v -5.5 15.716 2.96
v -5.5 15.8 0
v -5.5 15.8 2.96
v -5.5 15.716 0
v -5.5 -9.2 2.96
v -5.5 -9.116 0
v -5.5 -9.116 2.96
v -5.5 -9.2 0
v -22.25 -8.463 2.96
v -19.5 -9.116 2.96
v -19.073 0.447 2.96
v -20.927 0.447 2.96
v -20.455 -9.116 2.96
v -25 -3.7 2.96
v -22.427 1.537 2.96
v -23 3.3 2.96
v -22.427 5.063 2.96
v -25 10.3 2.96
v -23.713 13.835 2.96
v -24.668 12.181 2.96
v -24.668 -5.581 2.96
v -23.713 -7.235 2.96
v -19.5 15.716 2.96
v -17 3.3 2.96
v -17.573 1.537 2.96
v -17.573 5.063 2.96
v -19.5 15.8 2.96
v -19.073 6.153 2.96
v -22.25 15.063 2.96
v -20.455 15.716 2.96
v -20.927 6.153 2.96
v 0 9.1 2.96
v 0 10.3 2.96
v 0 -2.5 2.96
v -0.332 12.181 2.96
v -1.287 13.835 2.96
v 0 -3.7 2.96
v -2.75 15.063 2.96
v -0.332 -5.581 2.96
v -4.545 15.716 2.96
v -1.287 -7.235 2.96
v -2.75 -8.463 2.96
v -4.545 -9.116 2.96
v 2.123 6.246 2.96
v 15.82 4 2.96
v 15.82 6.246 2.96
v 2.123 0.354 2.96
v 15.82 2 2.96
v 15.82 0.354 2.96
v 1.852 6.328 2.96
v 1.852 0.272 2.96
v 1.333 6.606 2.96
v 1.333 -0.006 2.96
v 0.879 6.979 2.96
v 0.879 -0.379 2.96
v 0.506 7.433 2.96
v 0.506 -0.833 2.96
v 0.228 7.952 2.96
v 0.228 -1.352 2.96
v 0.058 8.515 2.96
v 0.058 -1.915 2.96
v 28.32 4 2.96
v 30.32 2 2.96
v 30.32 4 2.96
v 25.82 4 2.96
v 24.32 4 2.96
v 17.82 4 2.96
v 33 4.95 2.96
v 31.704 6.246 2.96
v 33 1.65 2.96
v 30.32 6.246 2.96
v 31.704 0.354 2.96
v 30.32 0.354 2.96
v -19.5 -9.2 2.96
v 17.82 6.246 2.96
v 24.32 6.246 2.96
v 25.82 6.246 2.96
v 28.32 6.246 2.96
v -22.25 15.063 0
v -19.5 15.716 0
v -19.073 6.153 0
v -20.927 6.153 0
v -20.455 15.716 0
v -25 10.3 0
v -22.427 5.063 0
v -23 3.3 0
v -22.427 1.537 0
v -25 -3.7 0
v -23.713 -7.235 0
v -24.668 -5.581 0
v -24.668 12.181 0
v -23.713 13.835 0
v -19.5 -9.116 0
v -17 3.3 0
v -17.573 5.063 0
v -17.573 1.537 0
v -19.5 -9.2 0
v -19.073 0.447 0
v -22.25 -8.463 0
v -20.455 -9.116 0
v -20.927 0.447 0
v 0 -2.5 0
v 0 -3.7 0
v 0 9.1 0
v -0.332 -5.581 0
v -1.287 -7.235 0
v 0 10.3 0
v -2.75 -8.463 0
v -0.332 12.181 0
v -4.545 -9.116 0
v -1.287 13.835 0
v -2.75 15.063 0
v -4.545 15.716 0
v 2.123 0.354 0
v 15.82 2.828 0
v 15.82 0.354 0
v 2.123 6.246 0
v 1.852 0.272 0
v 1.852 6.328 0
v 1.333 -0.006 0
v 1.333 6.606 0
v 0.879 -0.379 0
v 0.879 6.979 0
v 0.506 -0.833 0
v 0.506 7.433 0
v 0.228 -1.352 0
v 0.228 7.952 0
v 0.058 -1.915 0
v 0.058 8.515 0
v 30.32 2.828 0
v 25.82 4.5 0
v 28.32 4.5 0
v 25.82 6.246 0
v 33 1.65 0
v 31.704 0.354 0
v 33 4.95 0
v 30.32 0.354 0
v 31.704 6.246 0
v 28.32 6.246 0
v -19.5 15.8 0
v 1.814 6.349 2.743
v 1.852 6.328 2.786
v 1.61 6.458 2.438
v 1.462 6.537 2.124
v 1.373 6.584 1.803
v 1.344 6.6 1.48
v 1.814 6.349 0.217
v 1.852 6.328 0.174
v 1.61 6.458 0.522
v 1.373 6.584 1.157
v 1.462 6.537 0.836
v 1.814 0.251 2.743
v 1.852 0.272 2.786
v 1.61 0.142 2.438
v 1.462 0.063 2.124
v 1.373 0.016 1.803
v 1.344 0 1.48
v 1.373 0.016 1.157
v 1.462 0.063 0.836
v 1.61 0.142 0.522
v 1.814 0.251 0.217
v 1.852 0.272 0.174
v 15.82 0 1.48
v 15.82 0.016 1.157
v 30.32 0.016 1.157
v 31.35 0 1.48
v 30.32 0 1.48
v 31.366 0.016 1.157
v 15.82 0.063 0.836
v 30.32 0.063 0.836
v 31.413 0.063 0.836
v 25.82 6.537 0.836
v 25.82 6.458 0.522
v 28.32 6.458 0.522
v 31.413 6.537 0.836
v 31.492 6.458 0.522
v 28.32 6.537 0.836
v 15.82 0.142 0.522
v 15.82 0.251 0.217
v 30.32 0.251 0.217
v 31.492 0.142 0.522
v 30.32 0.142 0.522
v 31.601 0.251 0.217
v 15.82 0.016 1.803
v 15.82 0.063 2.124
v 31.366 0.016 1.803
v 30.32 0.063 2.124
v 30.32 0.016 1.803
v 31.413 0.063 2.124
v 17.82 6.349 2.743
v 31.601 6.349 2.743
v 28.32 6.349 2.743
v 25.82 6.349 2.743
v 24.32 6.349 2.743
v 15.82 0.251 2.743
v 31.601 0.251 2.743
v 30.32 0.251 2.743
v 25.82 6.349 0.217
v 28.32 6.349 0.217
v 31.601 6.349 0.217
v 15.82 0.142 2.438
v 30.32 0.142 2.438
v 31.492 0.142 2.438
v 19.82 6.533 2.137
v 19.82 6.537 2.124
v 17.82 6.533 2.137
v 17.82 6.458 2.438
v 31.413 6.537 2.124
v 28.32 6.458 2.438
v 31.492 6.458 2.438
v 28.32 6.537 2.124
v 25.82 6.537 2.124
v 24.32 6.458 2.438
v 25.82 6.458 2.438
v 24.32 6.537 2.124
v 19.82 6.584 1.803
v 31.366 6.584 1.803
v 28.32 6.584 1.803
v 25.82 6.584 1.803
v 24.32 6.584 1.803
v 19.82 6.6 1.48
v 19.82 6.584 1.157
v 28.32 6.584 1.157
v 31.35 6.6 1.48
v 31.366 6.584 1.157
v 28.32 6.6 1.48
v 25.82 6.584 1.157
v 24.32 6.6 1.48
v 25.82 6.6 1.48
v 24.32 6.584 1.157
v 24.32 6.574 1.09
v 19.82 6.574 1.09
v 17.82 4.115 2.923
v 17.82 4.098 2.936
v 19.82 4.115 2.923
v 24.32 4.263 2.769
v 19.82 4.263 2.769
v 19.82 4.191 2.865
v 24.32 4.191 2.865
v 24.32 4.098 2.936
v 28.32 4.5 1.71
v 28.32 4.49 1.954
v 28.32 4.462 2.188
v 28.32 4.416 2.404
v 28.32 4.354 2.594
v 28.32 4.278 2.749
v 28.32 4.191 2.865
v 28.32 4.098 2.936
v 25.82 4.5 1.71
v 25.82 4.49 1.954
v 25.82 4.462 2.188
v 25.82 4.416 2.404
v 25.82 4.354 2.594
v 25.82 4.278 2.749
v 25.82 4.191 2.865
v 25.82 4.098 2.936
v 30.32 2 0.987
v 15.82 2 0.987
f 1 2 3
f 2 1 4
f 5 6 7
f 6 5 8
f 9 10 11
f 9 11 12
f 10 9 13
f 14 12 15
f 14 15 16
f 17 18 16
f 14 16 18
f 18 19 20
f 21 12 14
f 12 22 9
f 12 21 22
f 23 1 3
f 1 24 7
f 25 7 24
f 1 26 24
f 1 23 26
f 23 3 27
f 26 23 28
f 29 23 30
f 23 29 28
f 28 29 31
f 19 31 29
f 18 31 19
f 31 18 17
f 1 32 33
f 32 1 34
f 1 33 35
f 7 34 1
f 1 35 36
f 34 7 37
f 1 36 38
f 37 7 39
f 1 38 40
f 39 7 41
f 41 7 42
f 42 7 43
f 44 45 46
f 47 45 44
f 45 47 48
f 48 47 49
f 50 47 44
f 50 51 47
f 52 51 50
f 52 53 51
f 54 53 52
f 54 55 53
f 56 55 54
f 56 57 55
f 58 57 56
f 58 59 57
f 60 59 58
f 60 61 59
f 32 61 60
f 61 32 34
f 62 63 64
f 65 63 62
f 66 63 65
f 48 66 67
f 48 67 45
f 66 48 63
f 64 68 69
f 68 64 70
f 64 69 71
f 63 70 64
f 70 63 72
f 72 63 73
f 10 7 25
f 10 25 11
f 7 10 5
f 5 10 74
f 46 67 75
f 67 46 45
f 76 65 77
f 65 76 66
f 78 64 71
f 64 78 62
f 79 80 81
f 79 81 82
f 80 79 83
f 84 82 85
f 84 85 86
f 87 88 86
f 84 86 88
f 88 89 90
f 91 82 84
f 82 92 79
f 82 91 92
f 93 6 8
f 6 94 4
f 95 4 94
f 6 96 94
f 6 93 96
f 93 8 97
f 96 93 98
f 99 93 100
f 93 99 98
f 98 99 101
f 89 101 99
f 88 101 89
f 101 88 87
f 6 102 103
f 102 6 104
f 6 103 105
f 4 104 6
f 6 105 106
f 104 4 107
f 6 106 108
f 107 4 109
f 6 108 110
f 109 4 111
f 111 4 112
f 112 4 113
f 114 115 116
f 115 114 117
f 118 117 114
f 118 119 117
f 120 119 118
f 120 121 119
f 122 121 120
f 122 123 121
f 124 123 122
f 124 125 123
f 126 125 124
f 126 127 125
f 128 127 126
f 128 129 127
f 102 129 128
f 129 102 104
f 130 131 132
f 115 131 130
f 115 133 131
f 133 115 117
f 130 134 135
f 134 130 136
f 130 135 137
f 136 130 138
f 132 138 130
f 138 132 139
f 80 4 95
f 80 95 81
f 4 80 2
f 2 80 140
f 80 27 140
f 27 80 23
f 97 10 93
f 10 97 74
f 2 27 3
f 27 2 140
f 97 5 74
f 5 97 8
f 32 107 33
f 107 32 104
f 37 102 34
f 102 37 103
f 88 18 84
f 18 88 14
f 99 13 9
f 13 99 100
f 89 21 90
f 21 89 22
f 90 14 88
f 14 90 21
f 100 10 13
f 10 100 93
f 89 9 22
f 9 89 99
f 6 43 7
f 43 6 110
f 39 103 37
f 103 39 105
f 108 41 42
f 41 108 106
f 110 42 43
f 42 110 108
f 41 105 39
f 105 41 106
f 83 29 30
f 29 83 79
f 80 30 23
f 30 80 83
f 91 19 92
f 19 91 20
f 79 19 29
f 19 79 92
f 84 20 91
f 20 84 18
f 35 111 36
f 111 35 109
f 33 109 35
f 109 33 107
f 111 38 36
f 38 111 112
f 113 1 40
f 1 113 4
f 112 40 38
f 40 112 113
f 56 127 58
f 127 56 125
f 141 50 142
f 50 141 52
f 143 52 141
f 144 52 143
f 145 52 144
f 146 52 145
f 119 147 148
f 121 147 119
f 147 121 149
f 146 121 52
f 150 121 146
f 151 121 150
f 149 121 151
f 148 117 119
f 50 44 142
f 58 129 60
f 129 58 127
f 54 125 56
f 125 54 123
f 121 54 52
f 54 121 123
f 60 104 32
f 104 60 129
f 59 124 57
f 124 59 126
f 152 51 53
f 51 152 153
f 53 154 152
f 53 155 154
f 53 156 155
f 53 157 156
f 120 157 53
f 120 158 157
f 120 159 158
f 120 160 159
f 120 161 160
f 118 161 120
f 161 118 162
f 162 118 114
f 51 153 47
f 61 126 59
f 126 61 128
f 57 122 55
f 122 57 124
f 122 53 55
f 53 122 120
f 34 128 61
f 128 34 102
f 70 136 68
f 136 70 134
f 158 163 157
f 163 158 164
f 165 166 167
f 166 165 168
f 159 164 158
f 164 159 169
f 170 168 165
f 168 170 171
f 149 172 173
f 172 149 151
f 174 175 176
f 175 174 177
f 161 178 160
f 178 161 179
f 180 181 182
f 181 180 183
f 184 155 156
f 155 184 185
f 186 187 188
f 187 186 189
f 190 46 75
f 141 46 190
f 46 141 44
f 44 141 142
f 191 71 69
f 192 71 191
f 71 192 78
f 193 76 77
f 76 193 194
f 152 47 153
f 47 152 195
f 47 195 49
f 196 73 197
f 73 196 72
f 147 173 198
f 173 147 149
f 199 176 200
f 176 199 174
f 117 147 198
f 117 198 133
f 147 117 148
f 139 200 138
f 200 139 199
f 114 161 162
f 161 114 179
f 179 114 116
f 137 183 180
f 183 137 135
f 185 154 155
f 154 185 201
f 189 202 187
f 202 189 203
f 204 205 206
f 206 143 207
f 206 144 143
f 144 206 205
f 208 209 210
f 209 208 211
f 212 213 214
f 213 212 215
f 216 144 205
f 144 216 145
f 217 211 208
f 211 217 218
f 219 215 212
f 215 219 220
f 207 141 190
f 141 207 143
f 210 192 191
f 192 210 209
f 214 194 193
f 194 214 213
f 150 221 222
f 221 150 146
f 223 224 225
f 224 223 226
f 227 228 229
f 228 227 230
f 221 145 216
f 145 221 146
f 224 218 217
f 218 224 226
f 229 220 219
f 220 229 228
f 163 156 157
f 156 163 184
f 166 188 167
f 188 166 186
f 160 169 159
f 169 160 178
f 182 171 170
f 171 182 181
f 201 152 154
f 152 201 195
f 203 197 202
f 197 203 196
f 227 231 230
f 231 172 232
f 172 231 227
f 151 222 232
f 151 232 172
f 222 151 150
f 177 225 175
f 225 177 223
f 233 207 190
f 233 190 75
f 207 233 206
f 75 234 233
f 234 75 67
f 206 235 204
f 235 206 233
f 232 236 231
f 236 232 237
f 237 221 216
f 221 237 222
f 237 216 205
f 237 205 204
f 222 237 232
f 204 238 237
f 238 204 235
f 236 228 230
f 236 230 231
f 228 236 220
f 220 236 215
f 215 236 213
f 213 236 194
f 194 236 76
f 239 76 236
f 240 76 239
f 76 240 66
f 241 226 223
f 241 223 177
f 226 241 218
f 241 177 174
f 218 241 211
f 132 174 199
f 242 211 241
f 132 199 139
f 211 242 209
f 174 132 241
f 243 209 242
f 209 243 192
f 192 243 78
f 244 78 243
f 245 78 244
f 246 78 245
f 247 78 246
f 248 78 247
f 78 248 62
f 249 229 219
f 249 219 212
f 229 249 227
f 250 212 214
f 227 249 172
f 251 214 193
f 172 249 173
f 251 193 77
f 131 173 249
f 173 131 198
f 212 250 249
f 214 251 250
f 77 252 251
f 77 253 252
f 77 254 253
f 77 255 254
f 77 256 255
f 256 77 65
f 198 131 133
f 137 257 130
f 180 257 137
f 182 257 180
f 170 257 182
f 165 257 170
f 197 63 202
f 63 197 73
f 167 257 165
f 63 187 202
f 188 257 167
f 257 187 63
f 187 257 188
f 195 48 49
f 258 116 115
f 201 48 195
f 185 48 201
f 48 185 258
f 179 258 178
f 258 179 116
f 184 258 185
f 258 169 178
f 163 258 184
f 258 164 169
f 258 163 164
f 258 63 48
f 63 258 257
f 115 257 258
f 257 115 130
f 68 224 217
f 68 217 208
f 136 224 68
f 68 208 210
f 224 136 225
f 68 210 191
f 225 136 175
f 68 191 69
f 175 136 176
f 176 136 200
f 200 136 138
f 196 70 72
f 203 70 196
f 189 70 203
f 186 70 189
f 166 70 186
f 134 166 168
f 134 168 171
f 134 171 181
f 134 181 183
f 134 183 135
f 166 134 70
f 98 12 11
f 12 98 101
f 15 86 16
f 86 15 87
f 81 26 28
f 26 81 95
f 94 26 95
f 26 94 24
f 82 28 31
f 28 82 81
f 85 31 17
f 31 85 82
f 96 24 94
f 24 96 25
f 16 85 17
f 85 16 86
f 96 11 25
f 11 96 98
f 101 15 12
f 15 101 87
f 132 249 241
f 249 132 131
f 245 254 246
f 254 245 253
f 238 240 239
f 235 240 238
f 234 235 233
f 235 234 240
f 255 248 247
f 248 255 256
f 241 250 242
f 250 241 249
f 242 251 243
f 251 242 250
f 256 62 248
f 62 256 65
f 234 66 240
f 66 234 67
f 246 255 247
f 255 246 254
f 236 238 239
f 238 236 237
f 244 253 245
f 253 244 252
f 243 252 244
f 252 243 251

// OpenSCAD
// Physical Keygen - by Nirav Patel <http://eclecti.cc>
//
// Generate a duplicate of an ABUS Plus key by editing the last line of the file
// and entering in the key code of the lock.  If you don't know the key code,
// you're going to need to get creative.  The first digit of the code is on the
// side closest to the shoulder. 6 is the minimum cut, which is uncut. 1 (0?)
// is the maximum cut.
//
// This work is licensed under a Creative Commons Attribution 3.0 Unported License.

module rounded(size, r) {
    union() {
        translate([r, 0, 0]) cube([size[0]-2*r, size[1], size[2]]);
        translate([0, r, 0]) cube([size[0], size[1]-2*r, size[2]]);
        translate([r, r, 0]) cylinder(h=size[2], r=r);
        translate([size[0]-r, r, 0]) cylinder(h=size[2], r=r);
        translate([r, size[1]-r, 0]) cylinder(h=size[2], r=r);
        translate([size[0]-r, size[1]-r, 0]) cylinder(h=size[2], r=r);
    }
}

module fillet(h, r) {
    difference() {
        cube([r, r, h]);
        translate([r, r, 0]) cylinder(h=h, r=r, $fn=32);
    }
}

module disc(thickness, angle) {
    rotate([angle, 0, 0]) cube([thickness, 10, 10]);
}

// ABUS Plus key.  Reverse engineered with measurements and information from
// Schuyler Towne and Jaakko Fagerlund
module abus_plus(bits) {
    // You may need to adjust these to fit your specific printer settings
    thickness = 2.96;
    length = 33.0;
    width = 6.6;
    
    shoulder = 2.68; // from tip
    depth_inc = 18; // degrees
    num_discs = 7;
    
    spacing = 2.0; // distance from the center of one disc to the next
    disc = 1.5; // thickness of the discs that will turn
    spacer = 0.5; // thickness of the spacers between the discs
    
    // Handle size
    h_l = 25;
    h_w = 25;
    
    union() {
        difference() {
            // blade and key handle
            union() {
                translate([-h_l, -h_w/2 + width/2, 0]) rounded([h_l, h_w, thickness], 5.5);
                
                translate([0, width-0.5, 0]) fillet(thickness, 3);
                translate([0, 0.5, 0]) mirror([0, 1, 0]) fillet(thickness, 3);
                
                intersection() {
                    translate([-1,0,0]) cube([length+1, width, thickness]);
                    
                    translate([-1, width/2, thickness/2]) rotate([0, 90, 0]) cylinder(h=length+1, r=width/2, $fn=64); 
                }
            }
            
            // chamfer the tip
           translate([length, width*(3/4), 0]) rotate([0, 0, 45]) cube([10, 10, thickness]);
           translate([length, width*(1/4), 0]) rotate([0, 0, 225]) cube([10, 10, thickness]);
            
            // put in a hole for keychain use
            translate([-h_l + 5, width/2, 0]) cylinder(h=thickness, r=3);
     
            // cut the actual bitting
            for (d = [0:(num_discs-1)]) {
                translate([length-shoulder-((num_discs-1)-d)*spacing-spacer, 4.0, thickness]) disc(spacer, -(6-bits[d])*depth_inc);
                translate([length-shoulder-((num_discs-1)-d)*spacing-spacing, 4.0, thickness]) disc(disc, -(6-bits[d])*depth_inc);
                translate([length-shoulder-((num_discs-1)-d)*spacing-(spacing+spacer), 4.0, thickness]) disc(spacer, -(6-bits[d])*depth_inc);
            }
            
            // cut an open channel into the other side.  one interfacing surface is enough
            translate([length-shoulder-(num_discs*spacing+spacer), 0, 0]) {
                cube([num_discs*spacing+spacer, 2, thickness]);
                translate([0, 2, thickness/3]) rotate([220, 0, 0]) cube([num_discs*spacing+spacer, 2, thickness]);
            }
        }
        
        // adds back in some thickness for the low value bits
        union() {
            translate([length-shoulder-(num_discs*spacing+spacer), 4.0, 0]) {
                cube([num_discs*spacing+spacer, 0.5, thickness-1.25]);
                translate([0, 0, thickness-1.25]) scale([1, 1, 2.5]) rotate([0, 90, 0]) cylinder(h=num_discs*spacing+spacer, r=0.5, $fn=32);
            }
        }
    }
}

// This sample key goes to a lock that is on my desk
abus_plus([6,5,4,4,6,1,6]);
